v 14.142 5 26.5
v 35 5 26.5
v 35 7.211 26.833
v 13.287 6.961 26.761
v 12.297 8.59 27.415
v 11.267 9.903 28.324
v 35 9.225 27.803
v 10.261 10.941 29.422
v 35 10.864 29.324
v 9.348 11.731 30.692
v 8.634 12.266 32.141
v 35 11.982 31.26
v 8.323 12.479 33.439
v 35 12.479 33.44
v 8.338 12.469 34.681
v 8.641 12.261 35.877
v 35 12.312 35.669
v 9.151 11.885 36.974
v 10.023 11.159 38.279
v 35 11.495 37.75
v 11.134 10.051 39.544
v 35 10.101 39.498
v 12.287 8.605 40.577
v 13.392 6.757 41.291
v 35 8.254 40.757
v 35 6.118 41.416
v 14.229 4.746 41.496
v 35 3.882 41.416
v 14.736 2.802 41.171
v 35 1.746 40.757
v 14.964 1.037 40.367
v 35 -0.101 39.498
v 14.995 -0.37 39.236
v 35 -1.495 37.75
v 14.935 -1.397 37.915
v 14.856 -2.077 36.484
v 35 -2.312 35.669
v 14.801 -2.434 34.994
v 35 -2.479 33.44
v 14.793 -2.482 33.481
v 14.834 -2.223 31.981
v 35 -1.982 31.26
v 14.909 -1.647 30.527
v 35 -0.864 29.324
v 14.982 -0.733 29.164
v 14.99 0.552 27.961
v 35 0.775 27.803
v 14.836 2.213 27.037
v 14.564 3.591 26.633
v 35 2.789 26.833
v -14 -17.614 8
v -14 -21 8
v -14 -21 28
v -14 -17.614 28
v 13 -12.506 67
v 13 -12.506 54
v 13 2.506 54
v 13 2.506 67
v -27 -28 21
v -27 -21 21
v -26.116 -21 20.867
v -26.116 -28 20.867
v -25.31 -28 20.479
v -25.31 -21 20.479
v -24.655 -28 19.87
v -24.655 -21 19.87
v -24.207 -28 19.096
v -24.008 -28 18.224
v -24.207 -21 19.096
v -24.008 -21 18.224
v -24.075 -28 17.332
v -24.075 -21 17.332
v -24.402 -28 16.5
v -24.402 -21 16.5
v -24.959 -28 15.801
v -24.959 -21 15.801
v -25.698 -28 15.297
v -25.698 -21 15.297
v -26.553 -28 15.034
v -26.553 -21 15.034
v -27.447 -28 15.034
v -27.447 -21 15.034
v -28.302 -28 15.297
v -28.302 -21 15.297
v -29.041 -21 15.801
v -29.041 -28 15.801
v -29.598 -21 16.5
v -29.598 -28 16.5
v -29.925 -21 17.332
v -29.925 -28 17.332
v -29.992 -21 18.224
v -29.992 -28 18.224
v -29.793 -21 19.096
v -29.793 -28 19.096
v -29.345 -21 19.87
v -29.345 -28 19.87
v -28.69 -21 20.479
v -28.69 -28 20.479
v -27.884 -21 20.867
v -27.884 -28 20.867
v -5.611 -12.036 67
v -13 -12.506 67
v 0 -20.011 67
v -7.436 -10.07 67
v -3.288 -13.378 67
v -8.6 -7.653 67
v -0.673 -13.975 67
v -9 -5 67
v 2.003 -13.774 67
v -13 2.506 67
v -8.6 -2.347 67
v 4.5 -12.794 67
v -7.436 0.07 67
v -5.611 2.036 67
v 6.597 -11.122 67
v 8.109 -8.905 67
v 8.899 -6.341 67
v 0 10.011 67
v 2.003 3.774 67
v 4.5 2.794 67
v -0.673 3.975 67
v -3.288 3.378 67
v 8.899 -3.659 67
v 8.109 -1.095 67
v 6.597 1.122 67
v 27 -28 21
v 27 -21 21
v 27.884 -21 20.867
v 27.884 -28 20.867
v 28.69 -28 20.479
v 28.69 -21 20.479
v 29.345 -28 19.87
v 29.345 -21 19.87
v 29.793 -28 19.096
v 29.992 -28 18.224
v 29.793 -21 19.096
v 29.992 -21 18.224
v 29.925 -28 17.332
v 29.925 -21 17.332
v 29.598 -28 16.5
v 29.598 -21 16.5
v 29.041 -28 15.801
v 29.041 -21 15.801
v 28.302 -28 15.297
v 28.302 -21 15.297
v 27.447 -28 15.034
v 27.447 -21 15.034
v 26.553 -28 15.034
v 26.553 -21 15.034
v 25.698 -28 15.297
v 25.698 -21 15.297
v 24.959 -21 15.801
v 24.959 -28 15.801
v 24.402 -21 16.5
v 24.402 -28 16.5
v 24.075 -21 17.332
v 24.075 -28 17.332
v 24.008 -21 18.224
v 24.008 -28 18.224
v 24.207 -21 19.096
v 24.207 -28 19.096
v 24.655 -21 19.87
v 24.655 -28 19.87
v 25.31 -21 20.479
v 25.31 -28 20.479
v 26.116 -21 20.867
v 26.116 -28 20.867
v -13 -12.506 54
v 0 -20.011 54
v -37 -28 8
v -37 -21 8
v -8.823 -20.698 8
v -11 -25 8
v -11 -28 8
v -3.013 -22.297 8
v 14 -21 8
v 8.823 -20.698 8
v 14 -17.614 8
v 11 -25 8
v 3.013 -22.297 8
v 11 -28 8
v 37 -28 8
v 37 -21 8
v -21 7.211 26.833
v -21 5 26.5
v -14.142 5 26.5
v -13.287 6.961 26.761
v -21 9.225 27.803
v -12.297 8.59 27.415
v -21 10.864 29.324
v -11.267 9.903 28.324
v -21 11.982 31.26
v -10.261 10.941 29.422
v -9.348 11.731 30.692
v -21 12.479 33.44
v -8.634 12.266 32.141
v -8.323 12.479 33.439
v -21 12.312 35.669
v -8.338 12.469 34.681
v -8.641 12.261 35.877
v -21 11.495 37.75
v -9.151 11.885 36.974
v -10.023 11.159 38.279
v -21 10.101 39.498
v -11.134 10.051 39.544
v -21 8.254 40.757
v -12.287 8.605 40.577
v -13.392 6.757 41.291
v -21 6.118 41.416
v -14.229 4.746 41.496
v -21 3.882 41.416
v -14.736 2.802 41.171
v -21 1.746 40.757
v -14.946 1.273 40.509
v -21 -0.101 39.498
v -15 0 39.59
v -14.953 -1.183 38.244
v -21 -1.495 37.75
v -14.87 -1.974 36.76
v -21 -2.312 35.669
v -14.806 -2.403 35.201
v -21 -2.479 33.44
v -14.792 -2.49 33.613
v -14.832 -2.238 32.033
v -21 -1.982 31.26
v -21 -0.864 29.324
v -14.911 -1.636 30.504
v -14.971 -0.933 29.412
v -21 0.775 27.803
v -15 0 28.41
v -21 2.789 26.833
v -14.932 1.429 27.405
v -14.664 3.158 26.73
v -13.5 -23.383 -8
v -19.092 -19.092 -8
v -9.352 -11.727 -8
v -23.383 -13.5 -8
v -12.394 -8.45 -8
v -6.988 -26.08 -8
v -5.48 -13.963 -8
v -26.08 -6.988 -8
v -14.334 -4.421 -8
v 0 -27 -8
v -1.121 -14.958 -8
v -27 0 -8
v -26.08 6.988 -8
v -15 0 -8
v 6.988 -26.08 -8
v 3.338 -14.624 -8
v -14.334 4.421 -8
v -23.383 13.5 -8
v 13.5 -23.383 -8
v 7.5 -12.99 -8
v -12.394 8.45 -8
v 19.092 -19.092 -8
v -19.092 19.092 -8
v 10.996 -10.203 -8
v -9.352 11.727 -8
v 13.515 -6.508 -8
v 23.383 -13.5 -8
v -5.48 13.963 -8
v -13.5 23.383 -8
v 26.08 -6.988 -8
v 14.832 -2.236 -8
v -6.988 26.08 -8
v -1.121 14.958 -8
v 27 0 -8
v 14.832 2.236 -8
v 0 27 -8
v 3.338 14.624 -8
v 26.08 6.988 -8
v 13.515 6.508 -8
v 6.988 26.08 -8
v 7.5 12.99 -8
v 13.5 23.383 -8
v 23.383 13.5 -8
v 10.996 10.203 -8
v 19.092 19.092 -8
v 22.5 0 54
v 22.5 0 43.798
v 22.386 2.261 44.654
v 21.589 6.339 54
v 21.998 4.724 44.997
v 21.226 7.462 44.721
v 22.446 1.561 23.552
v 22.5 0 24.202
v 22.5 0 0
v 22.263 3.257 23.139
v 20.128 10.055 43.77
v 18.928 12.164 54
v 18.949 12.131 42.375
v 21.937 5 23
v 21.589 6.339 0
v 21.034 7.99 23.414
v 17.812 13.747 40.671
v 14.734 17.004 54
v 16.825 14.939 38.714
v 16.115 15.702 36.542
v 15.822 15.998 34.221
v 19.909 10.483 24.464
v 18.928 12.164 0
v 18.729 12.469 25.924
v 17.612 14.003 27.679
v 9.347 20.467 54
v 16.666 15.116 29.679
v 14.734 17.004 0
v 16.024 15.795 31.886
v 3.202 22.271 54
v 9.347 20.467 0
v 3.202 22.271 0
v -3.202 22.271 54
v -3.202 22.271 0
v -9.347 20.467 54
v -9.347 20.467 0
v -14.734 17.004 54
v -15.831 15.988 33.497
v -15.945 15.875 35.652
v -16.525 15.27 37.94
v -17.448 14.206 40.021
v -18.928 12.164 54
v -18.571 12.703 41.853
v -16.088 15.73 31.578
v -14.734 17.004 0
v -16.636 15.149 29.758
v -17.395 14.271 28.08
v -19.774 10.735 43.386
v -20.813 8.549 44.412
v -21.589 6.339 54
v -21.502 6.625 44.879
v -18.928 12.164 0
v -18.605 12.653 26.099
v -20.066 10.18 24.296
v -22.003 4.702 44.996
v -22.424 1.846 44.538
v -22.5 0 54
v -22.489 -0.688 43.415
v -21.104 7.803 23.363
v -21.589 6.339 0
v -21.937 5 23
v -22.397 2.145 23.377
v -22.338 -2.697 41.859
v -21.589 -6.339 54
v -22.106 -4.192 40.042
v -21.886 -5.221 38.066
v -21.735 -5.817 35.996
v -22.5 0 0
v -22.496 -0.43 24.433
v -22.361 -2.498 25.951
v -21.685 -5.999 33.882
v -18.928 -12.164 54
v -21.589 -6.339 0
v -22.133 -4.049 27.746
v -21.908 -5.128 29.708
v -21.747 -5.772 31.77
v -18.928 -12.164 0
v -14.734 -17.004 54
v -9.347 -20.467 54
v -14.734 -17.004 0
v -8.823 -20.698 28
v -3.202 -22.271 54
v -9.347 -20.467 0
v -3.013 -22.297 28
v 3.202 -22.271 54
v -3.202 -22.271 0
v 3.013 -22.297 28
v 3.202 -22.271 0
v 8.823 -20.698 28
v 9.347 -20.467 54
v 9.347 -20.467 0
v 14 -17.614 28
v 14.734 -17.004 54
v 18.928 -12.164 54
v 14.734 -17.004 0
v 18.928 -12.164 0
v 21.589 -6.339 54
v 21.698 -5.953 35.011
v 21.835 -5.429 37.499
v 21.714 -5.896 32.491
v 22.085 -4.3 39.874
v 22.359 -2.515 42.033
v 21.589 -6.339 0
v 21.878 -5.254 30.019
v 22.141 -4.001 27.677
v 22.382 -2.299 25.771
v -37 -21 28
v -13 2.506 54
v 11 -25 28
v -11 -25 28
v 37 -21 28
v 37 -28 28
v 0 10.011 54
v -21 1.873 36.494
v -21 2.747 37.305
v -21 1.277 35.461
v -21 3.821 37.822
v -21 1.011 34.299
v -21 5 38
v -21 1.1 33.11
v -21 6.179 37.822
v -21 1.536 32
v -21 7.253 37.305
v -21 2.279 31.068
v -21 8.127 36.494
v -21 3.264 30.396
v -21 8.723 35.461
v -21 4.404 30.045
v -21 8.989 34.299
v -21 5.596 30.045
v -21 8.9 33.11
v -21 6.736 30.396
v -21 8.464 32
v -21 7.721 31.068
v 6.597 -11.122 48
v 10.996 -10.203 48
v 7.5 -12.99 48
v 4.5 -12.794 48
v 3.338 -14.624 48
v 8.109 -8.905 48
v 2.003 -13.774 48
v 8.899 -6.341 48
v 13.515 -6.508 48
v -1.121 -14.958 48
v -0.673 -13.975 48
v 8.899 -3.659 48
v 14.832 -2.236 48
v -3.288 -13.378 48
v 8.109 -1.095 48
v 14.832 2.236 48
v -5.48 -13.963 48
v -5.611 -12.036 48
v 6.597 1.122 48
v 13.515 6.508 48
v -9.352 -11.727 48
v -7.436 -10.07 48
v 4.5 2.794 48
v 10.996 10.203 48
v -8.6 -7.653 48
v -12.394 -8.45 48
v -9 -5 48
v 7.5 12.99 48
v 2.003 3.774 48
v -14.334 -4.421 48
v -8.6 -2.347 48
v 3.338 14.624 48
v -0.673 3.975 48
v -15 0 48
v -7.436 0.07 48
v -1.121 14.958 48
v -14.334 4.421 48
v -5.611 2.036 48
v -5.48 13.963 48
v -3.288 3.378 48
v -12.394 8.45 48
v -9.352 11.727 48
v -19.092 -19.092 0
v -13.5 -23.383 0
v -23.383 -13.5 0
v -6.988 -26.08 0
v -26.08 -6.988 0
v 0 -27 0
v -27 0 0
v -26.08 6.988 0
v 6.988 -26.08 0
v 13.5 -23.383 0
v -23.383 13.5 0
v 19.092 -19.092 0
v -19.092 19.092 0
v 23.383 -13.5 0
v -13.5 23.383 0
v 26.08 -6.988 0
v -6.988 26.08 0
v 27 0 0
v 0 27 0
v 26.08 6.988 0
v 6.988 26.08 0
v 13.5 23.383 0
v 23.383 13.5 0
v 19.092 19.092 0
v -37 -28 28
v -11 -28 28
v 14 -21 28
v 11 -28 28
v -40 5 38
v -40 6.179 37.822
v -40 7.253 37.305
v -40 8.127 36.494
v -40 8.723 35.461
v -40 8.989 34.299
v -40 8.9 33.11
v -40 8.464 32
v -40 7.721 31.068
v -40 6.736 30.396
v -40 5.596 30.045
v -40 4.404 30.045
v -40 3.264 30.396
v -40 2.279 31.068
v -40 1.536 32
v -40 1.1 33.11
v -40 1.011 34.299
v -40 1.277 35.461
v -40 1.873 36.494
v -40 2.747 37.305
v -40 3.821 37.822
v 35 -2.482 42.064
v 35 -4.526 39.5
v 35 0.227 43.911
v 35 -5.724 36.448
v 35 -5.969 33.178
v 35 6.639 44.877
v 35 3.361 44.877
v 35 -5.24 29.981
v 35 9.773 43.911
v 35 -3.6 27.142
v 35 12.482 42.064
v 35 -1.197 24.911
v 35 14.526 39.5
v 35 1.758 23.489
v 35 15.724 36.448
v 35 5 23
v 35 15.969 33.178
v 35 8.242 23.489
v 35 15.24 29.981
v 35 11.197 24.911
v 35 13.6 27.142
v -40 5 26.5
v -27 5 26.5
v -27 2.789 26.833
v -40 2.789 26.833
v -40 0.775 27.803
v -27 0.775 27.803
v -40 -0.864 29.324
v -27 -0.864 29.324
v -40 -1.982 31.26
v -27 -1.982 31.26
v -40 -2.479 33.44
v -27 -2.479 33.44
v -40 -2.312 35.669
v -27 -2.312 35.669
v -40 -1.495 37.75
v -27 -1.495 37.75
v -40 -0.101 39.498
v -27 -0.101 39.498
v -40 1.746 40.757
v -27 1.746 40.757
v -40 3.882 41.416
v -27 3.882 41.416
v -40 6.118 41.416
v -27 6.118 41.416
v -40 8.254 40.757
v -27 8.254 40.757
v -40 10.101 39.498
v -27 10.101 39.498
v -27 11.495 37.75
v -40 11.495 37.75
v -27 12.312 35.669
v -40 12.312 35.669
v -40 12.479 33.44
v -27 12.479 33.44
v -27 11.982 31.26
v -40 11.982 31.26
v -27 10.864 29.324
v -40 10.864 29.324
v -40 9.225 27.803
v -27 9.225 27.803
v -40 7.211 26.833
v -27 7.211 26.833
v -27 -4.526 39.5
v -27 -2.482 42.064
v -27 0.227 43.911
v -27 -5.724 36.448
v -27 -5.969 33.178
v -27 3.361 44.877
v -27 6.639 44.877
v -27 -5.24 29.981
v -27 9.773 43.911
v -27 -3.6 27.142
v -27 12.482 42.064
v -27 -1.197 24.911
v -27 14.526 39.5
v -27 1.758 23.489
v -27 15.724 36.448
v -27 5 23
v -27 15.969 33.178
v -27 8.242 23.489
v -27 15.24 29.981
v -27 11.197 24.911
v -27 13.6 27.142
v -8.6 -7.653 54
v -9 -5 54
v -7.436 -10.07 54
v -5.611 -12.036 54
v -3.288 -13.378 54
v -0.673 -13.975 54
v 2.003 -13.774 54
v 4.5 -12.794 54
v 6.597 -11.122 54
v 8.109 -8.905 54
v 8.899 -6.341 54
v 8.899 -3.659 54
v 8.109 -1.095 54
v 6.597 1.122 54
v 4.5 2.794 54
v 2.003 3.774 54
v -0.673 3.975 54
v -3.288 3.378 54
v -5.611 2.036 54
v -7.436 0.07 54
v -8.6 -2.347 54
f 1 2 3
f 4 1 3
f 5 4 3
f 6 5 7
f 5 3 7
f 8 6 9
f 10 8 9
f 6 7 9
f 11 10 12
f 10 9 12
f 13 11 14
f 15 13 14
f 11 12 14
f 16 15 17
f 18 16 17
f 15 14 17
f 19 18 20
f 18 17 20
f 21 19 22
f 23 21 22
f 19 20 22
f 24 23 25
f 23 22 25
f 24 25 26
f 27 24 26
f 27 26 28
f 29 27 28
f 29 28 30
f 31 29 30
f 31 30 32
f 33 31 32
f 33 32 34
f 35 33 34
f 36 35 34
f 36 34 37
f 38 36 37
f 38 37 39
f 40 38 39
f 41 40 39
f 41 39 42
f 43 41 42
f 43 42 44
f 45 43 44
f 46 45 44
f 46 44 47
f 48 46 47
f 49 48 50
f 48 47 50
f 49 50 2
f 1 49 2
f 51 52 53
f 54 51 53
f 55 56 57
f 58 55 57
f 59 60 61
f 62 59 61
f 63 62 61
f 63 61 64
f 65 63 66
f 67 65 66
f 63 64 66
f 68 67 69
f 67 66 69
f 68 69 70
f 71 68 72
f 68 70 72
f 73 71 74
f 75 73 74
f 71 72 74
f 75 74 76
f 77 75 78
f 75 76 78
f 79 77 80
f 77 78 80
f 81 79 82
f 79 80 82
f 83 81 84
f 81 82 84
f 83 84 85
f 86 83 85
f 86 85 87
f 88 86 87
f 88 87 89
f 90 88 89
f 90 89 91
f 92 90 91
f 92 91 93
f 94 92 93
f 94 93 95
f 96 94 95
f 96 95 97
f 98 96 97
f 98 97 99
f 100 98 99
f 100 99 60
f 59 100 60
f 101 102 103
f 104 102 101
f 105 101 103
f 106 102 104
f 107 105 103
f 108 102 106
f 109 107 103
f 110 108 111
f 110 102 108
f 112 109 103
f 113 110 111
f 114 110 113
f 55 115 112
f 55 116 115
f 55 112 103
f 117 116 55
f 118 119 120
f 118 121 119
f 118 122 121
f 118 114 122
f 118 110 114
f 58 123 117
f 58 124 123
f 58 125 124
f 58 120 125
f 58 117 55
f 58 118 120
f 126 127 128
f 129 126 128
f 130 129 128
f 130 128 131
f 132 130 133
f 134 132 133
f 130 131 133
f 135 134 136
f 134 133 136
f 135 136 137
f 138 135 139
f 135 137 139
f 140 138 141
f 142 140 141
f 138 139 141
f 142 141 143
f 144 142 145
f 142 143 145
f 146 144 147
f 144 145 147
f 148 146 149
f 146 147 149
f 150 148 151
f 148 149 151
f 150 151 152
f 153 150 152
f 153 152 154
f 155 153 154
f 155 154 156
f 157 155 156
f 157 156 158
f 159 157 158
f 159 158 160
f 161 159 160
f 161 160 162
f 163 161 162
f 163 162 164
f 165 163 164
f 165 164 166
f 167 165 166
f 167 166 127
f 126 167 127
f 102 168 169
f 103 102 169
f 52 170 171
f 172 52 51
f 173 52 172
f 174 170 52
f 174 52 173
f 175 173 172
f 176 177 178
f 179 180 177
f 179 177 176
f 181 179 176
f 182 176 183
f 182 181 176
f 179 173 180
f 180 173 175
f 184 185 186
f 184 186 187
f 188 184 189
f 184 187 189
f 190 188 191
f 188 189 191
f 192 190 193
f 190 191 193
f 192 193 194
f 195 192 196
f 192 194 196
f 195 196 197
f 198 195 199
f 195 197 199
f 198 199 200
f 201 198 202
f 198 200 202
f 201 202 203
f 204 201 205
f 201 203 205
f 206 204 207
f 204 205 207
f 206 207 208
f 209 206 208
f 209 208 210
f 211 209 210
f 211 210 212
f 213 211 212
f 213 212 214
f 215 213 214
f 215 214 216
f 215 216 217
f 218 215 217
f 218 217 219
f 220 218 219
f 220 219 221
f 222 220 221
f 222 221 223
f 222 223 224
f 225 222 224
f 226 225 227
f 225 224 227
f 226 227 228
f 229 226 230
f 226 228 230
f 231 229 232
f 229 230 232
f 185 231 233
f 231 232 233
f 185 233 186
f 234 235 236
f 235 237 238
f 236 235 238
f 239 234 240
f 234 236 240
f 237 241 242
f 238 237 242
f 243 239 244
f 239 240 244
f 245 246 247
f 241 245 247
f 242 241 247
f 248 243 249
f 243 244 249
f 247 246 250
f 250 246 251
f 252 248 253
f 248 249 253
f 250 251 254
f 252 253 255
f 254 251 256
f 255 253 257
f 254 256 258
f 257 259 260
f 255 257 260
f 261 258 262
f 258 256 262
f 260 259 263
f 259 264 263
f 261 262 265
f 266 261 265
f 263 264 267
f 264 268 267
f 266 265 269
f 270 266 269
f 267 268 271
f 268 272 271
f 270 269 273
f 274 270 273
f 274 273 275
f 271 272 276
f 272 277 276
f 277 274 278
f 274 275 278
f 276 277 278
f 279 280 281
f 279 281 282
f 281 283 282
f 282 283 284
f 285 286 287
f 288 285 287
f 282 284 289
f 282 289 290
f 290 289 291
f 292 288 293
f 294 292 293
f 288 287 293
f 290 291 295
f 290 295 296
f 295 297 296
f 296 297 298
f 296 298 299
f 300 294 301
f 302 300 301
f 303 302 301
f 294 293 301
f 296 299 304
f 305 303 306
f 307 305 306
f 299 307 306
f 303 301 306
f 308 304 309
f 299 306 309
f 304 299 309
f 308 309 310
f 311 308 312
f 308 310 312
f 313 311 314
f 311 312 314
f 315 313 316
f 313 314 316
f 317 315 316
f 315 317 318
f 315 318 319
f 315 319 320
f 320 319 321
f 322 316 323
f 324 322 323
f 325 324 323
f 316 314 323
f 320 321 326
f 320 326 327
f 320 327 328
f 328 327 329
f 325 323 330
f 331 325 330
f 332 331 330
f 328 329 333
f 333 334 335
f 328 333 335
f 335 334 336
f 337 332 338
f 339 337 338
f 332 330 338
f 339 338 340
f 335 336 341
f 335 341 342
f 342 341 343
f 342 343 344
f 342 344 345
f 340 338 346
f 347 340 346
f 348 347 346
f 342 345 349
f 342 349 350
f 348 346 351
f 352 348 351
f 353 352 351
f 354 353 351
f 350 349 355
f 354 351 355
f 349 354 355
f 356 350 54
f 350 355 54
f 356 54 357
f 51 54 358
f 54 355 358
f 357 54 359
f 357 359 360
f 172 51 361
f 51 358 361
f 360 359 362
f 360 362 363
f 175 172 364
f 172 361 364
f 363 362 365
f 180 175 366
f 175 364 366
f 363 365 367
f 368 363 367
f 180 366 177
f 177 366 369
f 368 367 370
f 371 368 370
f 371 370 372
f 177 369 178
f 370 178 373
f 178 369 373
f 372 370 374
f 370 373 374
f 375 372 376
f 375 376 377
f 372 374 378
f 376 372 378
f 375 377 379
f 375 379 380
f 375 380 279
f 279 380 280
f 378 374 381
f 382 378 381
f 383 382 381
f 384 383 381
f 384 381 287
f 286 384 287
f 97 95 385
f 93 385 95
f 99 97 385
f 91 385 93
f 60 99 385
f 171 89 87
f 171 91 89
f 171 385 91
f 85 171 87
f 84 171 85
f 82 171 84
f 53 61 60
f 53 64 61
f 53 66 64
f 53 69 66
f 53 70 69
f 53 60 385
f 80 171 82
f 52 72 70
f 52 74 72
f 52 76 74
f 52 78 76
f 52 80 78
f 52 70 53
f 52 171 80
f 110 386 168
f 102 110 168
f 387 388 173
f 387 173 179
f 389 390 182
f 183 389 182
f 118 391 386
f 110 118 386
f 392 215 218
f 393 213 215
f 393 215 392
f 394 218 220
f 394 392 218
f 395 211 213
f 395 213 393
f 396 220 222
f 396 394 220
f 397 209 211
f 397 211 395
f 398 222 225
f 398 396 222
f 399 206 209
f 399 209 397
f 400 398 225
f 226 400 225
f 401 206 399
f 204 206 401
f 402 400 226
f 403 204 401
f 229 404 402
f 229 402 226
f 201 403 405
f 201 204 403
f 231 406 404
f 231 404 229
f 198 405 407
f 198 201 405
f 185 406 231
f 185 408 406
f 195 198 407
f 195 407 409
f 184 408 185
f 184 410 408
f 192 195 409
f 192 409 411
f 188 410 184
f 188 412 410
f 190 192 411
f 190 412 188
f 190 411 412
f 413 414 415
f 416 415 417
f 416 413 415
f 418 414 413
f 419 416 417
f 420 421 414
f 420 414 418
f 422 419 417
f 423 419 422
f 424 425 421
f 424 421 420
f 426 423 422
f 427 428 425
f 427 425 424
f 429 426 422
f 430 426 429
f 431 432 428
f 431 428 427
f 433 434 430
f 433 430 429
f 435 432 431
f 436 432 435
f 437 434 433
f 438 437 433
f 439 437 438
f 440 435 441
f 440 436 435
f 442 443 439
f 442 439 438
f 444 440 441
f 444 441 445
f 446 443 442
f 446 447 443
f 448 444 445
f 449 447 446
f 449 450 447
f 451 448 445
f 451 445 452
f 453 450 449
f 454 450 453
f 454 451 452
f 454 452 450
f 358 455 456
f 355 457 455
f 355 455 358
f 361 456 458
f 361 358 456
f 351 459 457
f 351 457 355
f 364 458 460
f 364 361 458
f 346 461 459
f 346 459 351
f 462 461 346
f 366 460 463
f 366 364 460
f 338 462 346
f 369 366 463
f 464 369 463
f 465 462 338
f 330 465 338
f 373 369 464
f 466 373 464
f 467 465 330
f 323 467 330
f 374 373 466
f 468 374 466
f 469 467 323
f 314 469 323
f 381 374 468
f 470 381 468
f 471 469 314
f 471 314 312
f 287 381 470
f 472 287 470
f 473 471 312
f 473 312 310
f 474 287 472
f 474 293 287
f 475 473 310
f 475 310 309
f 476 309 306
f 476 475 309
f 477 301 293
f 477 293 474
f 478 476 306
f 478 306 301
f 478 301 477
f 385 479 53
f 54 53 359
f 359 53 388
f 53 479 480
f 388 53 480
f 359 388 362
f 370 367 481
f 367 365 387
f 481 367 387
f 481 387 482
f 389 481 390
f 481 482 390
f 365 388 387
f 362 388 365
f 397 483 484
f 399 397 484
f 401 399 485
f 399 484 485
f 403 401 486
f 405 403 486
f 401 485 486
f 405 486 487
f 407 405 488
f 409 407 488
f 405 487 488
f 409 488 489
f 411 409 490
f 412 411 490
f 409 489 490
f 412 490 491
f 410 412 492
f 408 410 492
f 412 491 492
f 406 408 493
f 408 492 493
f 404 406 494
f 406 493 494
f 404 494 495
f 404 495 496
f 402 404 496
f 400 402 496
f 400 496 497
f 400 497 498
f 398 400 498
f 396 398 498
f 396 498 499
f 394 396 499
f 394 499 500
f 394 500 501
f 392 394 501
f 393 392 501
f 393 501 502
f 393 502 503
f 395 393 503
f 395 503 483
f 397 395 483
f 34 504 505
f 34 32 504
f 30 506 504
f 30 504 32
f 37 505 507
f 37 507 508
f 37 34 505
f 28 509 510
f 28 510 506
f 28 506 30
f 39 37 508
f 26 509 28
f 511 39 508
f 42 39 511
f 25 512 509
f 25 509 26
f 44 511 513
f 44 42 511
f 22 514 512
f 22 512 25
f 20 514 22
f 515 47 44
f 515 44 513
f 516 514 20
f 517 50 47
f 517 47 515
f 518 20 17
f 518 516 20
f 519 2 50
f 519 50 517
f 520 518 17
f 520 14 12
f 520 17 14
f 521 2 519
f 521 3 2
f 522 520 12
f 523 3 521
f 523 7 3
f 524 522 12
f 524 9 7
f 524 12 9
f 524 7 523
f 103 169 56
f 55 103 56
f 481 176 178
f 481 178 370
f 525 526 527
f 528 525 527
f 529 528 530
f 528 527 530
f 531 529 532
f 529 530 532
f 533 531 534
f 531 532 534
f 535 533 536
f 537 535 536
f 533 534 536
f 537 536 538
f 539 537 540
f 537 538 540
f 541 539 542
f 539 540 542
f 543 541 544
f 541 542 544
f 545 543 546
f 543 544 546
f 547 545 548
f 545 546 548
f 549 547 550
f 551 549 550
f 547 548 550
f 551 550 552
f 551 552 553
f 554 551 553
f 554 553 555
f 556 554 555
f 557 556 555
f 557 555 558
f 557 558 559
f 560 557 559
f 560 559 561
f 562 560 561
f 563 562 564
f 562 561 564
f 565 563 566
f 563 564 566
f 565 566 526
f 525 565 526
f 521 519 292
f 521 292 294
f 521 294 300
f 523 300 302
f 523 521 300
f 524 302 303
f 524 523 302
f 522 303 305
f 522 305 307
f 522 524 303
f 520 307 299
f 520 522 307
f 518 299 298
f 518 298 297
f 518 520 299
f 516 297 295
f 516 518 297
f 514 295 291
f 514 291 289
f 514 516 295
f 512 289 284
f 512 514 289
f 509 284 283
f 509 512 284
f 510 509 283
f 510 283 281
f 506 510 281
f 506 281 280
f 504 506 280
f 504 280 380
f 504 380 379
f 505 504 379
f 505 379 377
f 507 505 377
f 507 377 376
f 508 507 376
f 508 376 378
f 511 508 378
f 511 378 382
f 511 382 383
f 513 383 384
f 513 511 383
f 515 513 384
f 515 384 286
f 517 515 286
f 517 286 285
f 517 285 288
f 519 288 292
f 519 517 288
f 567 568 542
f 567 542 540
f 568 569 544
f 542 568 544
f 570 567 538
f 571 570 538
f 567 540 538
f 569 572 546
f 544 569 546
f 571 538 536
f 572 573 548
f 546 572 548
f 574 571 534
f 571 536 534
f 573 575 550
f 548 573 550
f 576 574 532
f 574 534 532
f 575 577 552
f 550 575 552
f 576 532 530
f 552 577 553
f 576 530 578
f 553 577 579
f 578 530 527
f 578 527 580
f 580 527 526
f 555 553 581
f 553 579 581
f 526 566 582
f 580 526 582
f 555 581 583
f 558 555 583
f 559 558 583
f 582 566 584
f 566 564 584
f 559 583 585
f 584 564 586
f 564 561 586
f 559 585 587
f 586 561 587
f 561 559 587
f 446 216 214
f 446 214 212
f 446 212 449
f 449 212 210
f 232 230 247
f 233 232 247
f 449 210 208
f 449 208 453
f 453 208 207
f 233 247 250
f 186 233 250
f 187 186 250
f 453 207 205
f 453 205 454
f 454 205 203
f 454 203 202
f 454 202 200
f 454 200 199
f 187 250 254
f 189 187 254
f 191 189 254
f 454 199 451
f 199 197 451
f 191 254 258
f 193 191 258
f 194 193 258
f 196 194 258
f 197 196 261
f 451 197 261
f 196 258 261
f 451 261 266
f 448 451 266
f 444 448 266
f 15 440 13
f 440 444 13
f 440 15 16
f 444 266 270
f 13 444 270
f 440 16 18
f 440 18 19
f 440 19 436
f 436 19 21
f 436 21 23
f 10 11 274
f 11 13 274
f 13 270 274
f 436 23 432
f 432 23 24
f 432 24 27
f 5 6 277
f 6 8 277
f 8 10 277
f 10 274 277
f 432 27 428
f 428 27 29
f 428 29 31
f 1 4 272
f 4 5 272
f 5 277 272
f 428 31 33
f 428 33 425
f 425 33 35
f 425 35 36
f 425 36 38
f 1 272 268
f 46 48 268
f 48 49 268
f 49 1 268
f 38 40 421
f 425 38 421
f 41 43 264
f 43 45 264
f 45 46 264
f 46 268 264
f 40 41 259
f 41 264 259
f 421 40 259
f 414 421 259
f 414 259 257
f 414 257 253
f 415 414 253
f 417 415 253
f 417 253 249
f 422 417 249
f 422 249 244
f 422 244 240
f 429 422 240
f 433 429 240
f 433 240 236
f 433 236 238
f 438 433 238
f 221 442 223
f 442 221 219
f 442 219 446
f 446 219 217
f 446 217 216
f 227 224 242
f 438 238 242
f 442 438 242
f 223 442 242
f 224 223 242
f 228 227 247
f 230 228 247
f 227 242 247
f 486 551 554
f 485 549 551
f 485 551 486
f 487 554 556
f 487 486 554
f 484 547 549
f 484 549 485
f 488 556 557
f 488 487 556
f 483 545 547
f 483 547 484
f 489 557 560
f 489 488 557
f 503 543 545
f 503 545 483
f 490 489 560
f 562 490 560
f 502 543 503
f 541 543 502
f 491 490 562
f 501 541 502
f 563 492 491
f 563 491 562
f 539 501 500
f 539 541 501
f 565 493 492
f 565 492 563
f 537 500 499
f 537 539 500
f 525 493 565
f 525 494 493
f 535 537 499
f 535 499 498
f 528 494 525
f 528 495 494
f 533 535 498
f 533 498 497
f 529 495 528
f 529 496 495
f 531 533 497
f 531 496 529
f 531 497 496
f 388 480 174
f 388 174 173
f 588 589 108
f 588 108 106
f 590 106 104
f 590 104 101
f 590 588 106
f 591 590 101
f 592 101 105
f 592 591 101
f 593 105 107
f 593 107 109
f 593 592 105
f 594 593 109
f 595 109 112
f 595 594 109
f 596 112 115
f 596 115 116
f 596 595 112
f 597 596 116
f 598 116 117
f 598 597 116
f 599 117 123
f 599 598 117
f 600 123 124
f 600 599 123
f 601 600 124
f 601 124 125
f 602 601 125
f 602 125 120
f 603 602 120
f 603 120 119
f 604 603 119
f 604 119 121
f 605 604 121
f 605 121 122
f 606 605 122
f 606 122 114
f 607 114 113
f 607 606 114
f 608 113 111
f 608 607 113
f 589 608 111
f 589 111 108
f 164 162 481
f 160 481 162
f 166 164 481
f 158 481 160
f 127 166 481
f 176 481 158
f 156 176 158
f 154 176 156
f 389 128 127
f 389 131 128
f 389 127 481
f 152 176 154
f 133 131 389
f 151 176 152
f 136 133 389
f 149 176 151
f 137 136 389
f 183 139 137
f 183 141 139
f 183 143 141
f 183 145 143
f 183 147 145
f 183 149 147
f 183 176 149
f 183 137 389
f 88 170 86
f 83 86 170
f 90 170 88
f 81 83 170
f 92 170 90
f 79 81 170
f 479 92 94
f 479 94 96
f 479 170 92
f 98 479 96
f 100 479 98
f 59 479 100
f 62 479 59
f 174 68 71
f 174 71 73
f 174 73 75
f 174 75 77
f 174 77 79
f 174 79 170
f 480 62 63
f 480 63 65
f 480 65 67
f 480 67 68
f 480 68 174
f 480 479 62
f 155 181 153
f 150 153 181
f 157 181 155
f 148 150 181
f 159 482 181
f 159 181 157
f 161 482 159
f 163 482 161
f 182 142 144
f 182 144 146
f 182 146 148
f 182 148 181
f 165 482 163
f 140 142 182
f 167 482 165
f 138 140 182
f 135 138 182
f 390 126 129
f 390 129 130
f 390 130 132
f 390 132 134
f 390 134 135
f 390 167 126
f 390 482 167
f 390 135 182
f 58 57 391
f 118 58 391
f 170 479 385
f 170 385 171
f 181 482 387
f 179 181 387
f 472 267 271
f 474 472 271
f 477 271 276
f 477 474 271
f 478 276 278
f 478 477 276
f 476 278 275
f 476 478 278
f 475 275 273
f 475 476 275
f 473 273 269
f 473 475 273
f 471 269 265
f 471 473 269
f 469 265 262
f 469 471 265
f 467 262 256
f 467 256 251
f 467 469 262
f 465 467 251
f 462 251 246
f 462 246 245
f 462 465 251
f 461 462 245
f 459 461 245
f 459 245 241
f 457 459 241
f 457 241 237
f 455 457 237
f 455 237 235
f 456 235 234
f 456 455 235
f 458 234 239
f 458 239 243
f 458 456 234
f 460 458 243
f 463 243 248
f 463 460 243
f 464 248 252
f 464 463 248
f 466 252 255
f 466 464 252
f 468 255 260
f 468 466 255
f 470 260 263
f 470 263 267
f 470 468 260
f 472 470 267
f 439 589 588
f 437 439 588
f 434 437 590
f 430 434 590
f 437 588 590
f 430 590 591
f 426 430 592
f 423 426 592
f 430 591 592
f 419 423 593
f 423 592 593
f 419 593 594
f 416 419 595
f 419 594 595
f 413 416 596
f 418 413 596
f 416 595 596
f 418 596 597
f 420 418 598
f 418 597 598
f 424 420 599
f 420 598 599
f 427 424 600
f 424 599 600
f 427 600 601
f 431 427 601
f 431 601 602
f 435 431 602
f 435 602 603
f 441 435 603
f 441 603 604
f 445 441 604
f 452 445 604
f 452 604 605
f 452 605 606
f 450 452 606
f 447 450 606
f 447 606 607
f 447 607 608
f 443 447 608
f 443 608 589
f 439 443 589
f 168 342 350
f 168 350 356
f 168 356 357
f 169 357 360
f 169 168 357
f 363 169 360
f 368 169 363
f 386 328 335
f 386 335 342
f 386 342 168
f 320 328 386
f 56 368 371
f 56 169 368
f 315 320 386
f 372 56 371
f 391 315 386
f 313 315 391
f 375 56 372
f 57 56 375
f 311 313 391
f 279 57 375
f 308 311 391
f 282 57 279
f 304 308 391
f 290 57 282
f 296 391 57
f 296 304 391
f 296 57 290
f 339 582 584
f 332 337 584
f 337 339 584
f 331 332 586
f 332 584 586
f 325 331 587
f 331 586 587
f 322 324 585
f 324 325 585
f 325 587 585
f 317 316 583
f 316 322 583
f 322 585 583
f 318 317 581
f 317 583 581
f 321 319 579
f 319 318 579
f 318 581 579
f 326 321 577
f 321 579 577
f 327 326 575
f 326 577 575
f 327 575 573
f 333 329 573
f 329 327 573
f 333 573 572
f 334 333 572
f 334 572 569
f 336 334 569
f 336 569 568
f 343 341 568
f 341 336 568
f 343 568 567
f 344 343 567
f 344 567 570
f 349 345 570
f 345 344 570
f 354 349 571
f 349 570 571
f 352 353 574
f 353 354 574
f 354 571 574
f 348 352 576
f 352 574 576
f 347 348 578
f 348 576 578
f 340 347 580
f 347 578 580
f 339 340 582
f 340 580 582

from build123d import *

# Parameters (mm, degrees)
SKETCH_1_R           = 27
EXTRUDE_1_DEPTH      = 8
SKETCH_2_R           = 22.5
EXTRUDE_2_DEPTH      = 54
SKETCH_3_R           = 9
EXTRUDE_3_DEPTH      = 13
SKETCH_4_R           = 15
CUT_EXTRUDE_1_DEPTH  = 56
CUT_EXTRUDE_2_REACH  = 74.815
SKETCH_7_R           = 9
SKETCH_8_W           = 74
SKETCH_8_H           = 20
EXTRUDE_4_DEPTH      = 7
EXTRUDE_5_REACH      = 96.25
EXTRUDE_5_END_RADIUS = 22.5
SKETCH_9_W           = 28
SKETCH_9_H           = 20
CUT_EXTRUDE_3_REACH  = 62.614
SKETCH_10_W          = 22
SKETCH_10_H          = 6
EXTRUDE_7_REACH      = 104.259
EXTRUDE_7_END_RADIUS = 22.5
SKETCH_12_R          = 11
EXTRUDE_8_REACH      = 98.794
EXTRUDE_8_END_RADIUS = 22.5
SKETCH_15_R          = 11
SKETCH_13_R          = 7.5
CUT_EXTRUDE_6_DEPTH  = 56
SKETCH_16_R          = 7.5
EXTRUDE_9_DEPTH      = 13
SKETCH_17_R          = 4
CUT_EXTRUDE_7_DEPTH  = 30
SKETCH_18_R          = 3
CUT_EXTRUDE_8_DEPTH  = 30


with BuildPart() as part:
    # 草图1 → 凸台-拉伸1 (new body)
    with BuildSketch(Plane.XY):
        Circle(SKETCH_1_R)
    extrude(amount=-EXTRUDE_1_DEPTH)

    # 草图2 → 凸台-拉伸2 (add)
    with BuildSketch(Plane.XY):
        Circle(SKETCH_2_R)
    extrude(amount=EXTRUDE_2_DEPTH)

    # 草图3 → 凸台-拉伸3 (add)
    with BuildSketch(Plane.XY.offset(54)):
        Polygon((0, 10.011106999), (-13, 2.505553499), (-13, -12.505553499), (0, -20.011106999), (13, -12.505553499), (13, 2.505553499), align=None)
        with Locations(Location((0, -5, 0), (0, 0, 180))):
            Circle(SKETCH_3_R, mode=Mode.SUBTRACT)
    extrude(amount=EXTRUDE_3_DEPTH)

    # 草图4 → 切除-拉伸1 (cut)
    with BuildSketch(Plane(origin=(0, 0, -8), x_dir=(-1, 0, 0), z_dir=(0, 0, -1))):
        Circle(SKETCH_4_R)
    extrude(amount=-CUT_EXTRUDE_1_DEPTH, mode=Mode.SUBTRACT)

    # 草图7 → 切除-拉伸2 (cut, up to next)
    with BuildSketch(Plane.XY.offset(54), mode=Mode.PRIVATE) as cut_extrude_2_sk1:
        with Locations(Location((0, -5, 0), (0, 0, 180))):
            Circle(SKETCH_7_R)
    cut_extrude_2_tool1 = extrude(cut_extrude_2_sk1.sketch, amount=-CUT_EXTRUDE_2_REACH, mode=Mode.PRIVATE) & part.part
    add(cut_extrude_2_tool1.solids().sort_by_distance((0, -5, 54))[0], mode=Mode.SUBTRACT)

    # 草图8 → 凸台-拉伸4 (add)
    with BuildSketch(Plane(origin=(0, -28, 0), x_dir=(1, 0, 0), z_dir=(0, 1, 0))):
        with Locations((0, -18)):
            Rectangle(SKETCH_8_W, SKETCH_8_H)
    extrude(amount=EXTRUDE_4_DEPTH)

    # 凸台-拉伸5: up to this cylinder (the profile starts outside it)
    extrude_5_end = Plane(origin=(0, 0, 18), z_dir=(0, 0, -1)) * Cylinder(EXTRUDE_5_END_RADIUS, 238.5, mode=Mode.PRIVATE)
    # 草图9 → 凸台-拉伸5 (add, up to the surface)
    with BuildSketch(Plane.XZ.offset(28), mode=Mode.PRIVATE) as extrude_5_sk1:
        with Locations((0, 18)):
            Rectangle(SKETCH_9_W, SKETCH_9_H)
    extrude_5_tool1 = extrude(extrude_5_sk1.sketch, amount=-EXTRUDE_5_REACH, mode=Mode.PRIVATE) - extrude_5_end
    add(extrude_5_tool1.solids().sort_by_distance((0, -28, 18))[0])

    # 草图10 → 切除-拉伸3 (cut, up to next)
    with BuildSketch(Plane.XY.offset(28), mode=Mode.PRIVATE) as cut_extrude_3_sk1:
        with Locations((0, -28)):
            Rectangle(SKETCH_10_W, SKETCH_10_H)
    cut_extrude_3_tool1 = extrude(cut_extrude_3_sk1.sketch, amount=-CUT_EXTRUDE_3_REACH, mode=Mode.PRIVATE) & part.part
    add(cut_extrude_3_tool1.solids().sort_by_distance((0, -28, 28))[0], mode=Mode.SUBTRACT)

    # 凸台-拉伸7: up to this cylinder (the profile starts outside it)
    extrude_7_end = Plane(origin=(0, 0, 34), z_dir=(0, 0, -1)) * Cylinder(EXTRUDE_7_END_RADIUS, 254.518, mode=Mode.PRIVATE)
    # 草图12 → 凸台-拉伸7 (add, up to the surface)
    with BuildSketch(Plane(origin=(35, 0, 0), x_dir=(0, 0, -1), z_dir=(1, 0, 0)), mode=Mode.PRIVATE) as extrude_7_sk1:
        with Locations((-34, 5)):
            Circle(SKETCH_12_R)
    extrude_7_tool1 = extrude(extrude_7_sk1.sketch, amount=-EXTRUDE_7_REACH, mode=Mode.PRIVATE) - extrude_7_end
    add(extrude_7_tool1.solids().sort_by_distance((35, 5, 34))[0])

    # 凸台-拉伸8: up to this cylinder (the profile starts outside it)
    extrude_8_end = Plane(origin=(0, 0, 34), z_dir=(0, 0, -1)) * Cylinder(EXTRUDE_8_END_RADIUS, 243.588, mode=Mode.PRIVATE)
    # 草图15 → 凸台-拉伸8 (add, up to the surface)
    with BuildSketch(Plane(origin=(-27, 0, 0), x_dir=(0, 0, -1), z_dir=(1, 0, 0)), mode=Mode.PRIVATE) as extrude_8_sk1:
        with Locations((-34, 5)):
            Circle(SKETCH_15_R)
    extrude_8_tool1 = extrude(extrude_8_sk1.sketch, amount=EXTRUDE_8_REACH, mode=Mode.PRIVATE) - extrude_8_end
    add(extrude_8_tool1.solids().sort_by_distance((-27, 5, 34))[0])

    # 草图13 → 切除-拉伸6 (cut)
    with BuildSketch(Plane(origin=(35, 0, 0), x_dir=(0, 0, -1), z_dir=(1, 0, 0))):
        with Locations((-34, 5)):
            Circle(SKETCH_13_R)
    extrude(amount=-CUT_EXTRUDE_6_DEPTH, mode=Mode.SUBTRACT)

    # 草图16 → 凸台-拉伸9 (add)
    with BuildSketch(Plane.ZY.offset(27)):
        with Locations(Location((34, 5, 0), (0, 0, 180))):
            Circle(SKETCH_16_R)
    extrude(amount=EXTRUDE_9_DEPTH)

    # 草图17 → 切除-拉伸7 (cut)
    with BuildSketch(Plane.ZY.offset(40)):
        with Locations((34, 5)):
            Circle(SKETCH_17_R)
    extrude(amount=-CUT_EXTRUDE_7_DEPTH, mode=Mode.SUBTRACT)

    # 草图18 → 切除-拉伸8 (cut)
    with BuildSketch(Plane(origin=(0, -21, 0), x_dir=(1, 0, 0), z_dir=(0, 1, 0))):
        with Locations(Location((-27, -18, 0), (0, 0, 270))):
            Circle(SKETCH_18_R)
        with Locations(Location((27, -18, 0), (0, 0, 270))):
            Circle(SKETCH_18_R)
    extrude(amount=-CUT_EXTRUDE_8_DEPTH, mode=Mode.SUBTRACT)


solid = part.part
